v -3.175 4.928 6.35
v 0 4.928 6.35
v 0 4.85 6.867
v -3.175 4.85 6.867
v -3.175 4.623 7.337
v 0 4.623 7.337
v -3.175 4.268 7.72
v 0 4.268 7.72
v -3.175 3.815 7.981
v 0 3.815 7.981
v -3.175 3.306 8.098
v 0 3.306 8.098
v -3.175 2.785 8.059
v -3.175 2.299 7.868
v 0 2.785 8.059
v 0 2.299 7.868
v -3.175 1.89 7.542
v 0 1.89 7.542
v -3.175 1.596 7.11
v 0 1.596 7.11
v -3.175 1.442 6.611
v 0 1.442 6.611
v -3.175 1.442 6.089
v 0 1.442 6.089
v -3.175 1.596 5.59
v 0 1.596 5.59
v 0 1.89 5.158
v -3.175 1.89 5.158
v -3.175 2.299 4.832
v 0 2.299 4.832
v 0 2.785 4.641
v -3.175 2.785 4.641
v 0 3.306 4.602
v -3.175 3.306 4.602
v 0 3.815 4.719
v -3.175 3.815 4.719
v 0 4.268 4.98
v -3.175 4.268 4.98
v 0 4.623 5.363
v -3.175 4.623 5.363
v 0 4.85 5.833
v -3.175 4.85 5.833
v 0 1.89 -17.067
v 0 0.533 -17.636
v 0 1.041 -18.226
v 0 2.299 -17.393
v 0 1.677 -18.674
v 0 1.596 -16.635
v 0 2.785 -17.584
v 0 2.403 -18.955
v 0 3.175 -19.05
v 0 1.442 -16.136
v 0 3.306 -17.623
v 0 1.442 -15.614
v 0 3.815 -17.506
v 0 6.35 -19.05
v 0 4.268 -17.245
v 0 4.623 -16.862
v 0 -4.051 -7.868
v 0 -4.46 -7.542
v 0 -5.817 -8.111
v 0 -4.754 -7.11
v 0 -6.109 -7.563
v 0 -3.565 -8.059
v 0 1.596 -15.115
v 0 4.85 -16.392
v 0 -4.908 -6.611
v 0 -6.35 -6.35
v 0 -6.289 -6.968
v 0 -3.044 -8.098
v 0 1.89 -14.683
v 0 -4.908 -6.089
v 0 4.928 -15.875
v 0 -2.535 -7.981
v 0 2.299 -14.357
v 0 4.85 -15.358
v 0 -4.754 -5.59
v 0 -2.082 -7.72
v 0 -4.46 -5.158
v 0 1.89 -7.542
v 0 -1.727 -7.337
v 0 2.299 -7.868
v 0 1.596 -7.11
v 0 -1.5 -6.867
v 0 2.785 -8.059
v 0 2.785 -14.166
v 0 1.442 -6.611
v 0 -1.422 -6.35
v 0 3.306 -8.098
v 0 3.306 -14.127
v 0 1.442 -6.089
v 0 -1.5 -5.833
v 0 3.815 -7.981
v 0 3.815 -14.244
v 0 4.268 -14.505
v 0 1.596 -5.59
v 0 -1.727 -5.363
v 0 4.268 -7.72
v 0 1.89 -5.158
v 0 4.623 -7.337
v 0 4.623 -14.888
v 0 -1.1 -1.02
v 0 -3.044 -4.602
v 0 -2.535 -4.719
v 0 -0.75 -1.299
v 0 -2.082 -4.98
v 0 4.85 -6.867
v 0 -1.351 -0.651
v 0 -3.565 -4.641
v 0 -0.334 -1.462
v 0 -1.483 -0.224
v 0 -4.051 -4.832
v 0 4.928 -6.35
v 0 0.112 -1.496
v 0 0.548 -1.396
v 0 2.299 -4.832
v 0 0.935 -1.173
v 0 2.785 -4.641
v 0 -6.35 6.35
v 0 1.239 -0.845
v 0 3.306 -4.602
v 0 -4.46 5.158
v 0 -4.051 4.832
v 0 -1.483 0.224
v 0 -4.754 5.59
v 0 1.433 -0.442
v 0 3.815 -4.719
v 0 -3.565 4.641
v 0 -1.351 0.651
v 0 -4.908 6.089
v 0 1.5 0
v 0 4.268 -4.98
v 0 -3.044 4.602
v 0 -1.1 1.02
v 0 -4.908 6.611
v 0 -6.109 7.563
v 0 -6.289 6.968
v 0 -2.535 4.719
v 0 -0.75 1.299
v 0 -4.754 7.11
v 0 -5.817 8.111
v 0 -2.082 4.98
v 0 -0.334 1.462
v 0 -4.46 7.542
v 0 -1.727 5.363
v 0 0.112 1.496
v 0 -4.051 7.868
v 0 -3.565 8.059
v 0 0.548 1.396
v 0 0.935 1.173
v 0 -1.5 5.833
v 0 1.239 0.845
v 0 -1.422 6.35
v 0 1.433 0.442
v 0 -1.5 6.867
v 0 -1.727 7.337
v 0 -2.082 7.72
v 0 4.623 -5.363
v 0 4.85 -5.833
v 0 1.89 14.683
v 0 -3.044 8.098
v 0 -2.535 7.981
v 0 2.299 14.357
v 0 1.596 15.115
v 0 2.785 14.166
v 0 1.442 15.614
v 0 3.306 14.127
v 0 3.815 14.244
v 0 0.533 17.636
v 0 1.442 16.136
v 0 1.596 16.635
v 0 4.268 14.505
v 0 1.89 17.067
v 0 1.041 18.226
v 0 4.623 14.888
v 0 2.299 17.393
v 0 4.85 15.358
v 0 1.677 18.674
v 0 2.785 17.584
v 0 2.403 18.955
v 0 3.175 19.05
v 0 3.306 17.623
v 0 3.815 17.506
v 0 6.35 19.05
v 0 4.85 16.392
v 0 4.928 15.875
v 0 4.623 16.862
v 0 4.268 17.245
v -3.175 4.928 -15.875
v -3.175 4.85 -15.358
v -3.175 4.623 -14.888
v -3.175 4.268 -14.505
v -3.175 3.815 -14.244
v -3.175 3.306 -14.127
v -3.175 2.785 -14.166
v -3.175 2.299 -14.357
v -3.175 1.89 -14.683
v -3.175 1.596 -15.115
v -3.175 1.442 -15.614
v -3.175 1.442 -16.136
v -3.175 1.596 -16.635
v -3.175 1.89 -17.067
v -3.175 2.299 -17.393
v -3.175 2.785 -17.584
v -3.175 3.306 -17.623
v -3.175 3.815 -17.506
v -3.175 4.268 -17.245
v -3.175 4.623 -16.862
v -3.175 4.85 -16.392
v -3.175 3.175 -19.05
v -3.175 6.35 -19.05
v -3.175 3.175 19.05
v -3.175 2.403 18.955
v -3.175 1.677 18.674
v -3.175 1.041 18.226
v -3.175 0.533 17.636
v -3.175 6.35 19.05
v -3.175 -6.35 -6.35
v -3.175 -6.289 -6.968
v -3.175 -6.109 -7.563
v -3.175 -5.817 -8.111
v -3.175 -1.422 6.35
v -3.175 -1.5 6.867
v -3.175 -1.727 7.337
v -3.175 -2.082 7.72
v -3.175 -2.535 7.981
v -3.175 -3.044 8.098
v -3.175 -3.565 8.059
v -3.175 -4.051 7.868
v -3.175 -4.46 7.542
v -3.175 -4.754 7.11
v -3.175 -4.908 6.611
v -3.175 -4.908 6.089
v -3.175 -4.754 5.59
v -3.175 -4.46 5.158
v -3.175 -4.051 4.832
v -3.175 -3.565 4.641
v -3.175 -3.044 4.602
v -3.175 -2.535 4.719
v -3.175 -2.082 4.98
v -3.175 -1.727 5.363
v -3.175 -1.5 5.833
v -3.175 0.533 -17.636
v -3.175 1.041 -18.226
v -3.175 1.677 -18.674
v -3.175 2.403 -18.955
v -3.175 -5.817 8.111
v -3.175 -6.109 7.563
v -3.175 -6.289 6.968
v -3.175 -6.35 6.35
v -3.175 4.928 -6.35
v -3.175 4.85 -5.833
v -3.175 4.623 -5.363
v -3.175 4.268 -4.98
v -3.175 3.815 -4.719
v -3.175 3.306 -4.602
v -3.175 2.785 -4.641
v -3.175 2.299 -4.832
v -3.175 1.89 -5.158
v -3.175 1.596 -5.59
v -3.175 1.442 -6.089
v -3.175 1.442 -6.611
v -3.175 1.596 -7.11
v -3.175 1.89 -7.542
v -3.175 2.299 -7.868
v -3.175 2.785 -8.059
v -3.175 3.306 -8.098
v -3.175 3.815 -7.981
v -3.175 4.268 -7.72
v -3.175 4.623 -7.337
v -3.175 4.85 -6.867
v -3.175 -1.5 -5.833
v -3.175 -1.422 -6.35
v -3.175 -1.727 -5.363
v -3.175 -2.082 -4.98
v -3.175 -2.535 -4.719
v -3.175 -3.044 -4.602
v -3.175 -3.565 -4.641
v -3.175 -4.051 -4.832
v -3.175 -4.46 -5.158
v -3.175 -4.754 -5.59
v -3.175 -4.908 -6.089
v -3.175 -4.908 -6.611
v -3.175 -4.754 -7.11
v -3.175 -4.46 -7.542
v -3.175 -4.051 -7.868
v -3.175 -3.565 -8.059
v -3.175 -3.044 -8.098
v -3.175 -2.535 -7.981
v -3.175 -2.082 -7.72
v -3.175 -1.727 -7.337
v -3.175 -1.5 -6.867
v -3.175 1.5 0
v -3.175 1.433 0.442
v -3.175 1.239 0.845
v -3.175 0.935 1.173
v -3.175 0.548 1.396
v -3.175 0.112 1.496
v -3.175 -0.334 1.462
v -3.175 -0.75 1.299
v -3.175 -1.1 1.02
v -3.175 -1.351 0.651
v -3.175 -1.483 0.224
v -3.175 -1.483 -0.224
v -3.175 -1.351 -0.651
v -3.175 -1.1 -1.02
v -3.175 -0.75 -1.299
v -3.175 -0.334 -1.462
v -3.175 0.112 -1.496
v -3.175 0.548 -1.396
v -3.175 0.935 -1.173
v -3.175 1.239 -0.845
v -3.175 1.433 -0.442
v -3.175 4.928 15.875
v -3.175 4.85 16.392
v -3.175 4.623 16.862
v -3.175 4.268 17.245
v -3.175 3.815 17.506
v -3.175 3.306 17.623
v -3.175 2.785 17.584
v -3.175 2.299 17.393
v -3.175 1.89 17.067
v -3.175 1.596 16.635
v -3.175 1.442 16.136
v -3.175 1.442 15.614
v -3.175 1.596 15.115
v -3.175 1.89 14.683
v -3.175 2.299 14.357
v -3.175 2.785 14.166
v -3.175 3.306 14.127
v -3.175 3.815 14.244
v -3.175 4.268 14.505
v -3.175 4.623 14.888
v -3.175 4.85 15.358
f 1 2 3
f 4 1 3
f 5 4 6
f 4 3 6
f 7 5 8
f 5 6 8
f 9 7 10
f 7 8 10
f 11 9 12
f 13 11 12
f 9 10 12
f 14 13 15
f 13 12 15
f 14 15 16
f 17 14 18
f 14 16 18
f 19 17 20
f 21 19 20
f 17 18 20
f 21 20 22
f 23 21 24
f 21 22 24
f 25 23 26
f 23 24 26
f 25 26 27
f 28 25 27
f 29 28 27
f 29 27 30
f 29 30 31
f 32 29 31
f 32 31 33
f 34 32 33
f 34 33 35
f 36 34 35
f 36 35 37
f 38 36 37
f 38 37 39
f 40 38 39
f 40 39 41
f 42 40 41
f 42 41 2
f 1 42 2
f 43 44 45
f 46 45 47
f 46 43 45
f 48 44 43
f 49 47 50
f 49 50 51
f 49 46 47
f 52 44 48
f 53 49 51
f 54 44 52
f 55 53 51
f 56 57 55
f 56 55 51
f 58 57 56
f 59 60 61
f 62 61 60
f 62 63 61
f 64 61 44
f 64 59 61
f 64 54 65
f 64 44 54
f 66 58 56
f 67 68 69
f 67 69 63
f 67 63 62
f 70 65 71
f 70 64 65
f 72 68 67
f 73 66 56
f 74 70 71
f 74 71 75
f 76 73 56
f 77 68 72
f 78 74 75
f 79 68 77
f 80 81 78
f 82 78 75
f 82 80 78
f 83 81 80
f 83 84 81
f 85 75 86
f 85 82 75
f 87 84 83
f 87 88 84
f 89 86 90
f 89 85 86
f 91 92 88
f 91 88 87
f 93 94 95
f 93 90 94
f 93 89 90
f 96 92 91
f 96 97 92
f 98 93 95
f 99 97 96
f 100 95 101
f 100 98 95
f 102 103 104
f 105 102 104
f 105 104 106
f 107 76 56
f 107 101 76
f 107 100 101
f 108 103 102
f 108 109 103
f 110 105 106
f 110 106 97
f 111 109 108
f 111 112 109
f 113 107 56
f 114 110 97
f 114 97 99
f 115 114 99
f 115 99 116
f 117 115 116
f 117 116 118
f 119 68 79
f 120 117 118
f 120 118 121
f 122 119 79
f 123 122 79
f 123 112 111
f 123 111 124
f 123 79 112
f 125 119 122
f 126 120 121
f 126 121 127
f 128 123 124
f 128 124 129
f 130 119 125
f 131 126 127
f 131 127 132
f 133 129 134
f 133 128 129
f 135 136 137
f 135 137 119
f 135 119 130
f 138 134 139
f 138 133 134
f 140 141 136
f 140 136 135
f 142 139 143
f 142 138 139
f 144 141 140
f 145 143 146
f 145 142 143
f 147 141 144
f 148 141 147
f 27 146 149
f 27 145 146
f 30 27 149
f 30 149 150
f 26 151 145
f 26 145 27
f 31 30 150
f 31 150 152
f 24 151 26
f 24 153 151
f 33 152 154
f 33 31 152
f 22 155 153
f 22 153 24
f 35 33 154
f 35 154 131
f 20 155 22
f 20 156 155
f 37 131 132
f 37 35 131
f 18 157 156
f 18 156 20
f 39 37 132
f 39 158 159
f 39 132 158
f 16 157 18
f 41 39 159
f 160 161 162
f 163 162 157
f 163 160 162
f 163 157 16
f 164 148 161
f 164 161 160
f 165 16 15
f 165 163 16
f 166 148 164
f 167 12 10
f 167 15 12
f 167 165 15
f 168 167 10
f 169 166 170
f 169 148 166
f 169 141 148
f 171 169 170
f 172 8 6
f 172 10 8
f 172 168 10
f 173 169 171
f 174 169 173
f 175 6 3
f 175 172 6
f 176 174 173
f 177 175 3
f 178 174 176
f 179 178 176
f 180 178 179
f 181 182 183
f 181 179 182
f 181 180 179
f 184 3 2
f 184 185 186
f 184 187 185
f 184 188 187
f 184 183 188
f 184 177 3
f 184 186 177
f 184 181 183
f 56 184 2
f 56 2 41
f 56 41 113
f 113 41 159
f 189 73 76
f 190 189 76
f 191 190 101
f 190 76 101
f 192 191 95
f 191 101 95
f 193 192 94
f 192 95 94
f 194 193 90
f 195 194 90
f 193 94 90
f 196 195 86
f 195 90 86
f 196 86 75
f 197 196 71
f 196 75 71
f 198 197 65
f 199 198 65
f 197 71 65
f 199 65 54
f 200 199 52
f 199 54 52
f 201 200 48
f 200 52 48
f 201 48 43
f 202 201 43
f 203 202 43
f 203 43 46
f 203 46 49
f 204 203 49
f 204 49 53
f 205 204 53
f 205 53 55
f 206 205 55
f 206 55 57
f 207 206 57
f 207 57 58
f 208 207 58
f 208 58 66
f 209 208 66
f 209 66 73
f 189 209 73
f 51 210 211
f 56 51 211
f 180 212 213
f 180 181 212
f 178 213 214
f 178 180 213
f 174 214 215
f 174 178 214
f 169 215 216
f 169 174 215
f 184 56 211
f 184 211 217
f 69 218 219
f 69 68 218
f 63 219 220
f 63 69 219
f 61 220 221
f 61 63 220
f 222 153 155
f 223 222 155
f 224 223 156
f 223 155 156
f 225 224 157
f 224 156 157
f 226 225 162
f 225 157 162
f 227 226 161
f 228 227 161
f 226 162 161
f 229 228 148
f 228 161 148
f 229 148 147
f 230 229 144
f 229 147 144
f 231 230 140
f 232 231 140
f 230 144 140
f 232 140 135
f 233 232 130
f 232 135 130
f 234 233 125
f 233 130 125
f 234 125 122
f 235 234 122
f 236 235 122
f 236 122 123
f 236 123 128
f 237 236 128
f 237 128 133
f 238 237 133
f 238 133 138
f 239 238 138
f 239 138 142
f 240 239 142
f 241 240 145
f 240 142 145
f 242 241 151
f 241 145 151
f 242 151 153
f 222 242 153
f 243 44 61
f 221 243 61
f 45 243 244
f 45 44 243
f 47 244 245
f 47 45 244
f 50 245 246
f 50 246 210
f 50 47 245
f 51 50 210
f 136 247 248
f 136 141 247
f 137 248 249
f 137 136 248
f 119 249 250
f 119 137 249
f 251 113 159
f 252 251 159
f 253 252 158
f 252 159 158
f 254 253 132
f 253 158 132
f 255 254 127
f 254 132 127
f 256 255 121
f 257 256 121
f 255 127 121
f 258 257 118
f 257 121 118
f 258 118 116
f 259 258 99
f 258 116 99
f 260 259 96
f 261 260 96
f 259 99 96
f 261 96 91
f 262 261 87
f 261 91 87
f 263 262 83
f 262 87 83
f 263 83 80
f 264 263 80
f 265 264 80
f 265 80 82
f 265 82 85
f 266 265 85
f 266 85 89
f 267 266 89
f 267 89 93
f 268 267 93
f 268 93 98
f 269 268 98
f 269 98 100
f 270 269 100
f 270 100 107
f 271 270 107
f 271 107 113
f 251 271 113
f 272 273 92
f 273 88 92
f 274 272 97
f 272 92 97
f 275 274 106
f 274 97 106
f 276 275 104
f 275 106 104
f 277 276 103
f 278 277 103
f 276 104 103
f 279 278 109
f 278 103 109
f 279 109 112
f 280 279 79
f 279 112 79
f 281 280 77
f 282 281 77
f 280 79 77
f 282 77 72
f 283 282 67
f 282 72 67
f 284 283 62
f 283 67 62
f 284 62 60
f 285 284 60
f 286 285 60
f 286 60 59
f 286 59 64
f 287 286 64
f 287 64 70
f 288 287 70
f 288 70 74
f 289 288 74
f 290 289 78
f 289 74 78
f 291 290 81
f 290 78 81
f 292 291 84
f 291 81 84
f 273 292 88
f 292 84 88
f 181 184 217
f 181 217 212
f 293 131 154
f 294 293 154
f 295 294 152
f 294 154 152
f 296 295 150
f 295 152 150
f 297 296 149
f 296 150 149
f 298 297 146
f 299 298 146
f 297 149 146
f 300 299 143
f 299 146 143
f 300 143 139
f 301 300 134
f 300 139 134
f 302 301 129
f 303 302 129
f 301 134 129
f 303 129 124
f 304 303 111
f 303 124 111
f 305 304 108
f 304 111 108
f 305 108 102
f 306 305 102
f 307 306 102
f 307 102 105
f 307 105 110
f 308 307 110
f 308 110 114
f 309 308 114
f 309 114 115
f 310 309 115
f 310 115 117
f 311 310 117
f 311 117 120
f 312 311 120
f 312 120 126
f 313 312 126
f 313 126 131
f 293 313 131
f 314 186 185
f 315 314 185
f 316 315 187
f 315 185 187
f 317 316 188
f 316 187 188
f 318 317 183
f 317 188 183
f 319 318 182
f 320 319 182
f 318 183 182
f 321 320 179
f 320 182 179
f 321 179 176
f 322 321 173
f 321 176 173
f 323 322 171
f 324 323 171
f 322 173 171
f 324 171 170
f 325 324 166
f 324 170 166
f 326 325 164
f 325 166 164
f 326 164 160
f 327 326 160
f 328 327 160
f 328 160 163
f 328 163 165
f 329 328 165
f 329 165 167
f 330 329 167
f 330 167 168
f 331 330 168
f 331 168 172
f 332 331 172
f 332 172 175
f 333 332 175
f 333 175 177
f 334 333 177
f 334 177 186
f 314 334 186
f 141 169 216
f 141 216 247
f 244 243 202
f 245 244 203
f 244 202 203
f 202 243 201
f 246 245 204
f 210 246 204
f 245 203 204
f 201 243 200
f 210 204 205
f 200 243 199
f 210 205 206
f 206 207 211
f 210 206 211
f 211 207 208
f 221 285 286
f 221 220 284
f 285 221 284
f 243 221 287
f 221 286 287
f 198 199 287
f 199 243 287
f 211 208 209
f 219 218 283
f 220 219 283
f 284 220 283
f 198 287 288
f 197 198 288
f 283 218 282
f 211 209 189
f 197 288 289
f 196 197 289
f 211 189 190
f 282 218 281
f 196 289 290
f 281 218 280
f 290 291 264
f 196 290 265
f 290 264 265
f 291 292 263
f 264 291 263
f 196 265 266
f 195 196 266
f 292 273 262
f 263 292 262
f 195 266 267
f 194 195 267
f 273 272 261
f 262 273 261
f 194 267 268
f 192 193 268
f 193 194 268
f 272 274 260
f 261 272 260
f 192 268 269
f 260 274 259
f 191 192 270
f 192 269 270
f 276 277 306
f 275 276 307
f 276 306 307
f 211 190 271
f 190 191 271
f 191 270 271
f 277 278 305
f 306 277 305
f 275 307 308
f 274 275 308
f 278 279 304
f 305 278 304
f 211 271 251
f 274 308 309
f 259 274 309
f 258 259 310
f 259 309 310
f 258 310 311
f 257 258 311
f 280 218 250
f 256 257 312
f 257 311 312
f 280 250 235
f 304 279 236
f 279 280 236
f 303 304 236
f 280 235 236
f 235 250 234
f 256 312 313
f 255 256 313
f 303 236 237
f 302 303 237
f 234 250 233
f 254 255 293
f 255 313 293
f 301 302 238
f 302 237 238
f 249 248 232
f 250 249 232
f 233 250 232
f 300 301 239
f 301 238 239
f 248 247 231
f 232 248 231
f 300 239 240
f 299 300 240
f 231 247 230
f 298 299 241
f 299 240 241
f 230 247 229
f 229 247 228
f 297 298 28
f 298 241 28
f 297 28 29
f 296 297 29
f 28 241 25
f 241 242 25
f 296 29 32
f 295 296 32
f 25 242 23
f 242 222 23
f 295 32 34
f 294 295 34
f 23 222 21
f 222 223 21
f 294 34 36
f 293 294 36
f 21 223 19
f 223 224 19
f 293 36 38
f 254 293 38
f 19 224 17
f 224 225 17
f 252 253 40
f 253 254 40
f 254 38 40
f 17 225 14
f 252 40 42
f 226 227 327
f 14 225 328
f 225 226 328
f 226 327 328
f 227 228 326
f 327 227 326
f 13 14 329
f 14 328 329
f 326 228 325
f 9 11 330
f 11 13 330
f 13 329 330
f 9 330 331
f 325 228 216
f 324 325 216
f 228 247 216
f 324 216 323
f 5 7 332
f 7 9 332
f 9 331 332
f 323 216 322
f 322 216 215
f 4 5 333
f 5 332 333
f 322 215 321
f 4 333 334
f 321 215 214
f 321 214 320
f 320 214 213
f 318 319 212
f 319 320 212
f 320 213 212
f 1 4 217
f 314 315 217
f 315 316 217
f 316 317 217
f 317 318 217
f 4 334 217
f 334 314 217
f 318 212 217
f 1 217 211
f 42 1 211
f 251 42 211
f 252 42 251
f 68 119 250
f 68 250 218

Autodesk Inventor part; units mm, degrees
ref_plane "YZ Plane" through (0, 0, 0) normal (1, 0, 0) x (0, 1, 0)
ref_plane "XZ Plane" through (0, 0, 0) normal (0, 1, 0) x (-1, 0, 0)
ref_plane "XY Plane" through (0, 0, 0) normal (0, 0, 1) x (1, 0, 0)
sketch "Sketch1" plane through (0, 0, 0) normal (1, 0, 0) x (0, 1, 0)
  line L0 (3.175, 6.35) -> (-3.175, 6.35) construction
  line L1 (-3.175, 6.35) -> (-3.175, -6.35) construction
  line L2 (-3.175, -6.35) -> (3.175, -6.35) construction
  line L3 (3.175, -6.35) -> (3.175, 6.35) construction
  line L4 (3.175, 6.35) -> (-3.175, -6.35) construction
  line L5 (-3.175, 6.35) -> (3.175, -6.35) construction
  circle A0 centre (0, 0) radius 1.5
  circle A1 centre (3.175, 6.35) radius 1.7526
  circle A2 centre (3.175, -6.35) radius 1.7526
  circle A3 centre (-3.175, 6.35) radius 1.7526
  circle A4 centre (-3.175, -6.35) radius 1.7526
  line L6 (6.35, 19.05) -> (-6.35, 19.05)
  line L7 (-6.35, 19.05) -> (-6.35, -19.05)
  line L8 (-6.35, -19.05) -> (6.35, -19.05)
  line L9 (6.35, -19.05) -> (6.35, 19.05)
  line L10 (6.35, 19.05) -> (-6.35, -19.05) construction
  line L11 (-6.35, 19.05) -> (6.35, -19.05) construction
  line L12 (-6.35, 0) -> (6.35, 0) construction
  line L13 (-6.35, -3.175) -> (6.35, -3.175)
  line L14 (6.35, 3.175) -> (-6.35, 3.175)
  arc A5 (-6.35, 3.175) -> (-6.35, -3.175) centre (-6.35, 0) ccw
  arc A6 (6.35, -3.175) -> (6.35, 3.175) centre (6.35, 0) ccw
  circle A7 centre (3.175, 15.875) radius 1.7526
  arc A8 (3.175, 19.05) -> (0.5332, 17.6362) centre (3.175, 15.875) ccw
  arc A9 (-5.8168, 8.1112) -> (-6.35, 6.35) centre (-3.175, 6.35) ccw
  line L15 (0.5332, 17.6362) -> (-5.8168, 8.1112)
  circle A10 centre (3.175, -15.875) radius 1.7526
  arc A11 (0.5332, -17.6362) -> (3.175, -19.05) centre (3.175, -15.875) ccw
  arc A12 (-6.35, -6.35) -> (-5.8168, -8.1112) centre (-3.175, -6.35) ccw
  line L16 (0.5332, -17.6362) -> (-5.8168, -8.1112)
  point P0 (3.175, -19.05)
  point P1 (-6.35, -6.35)
  dimension "d0" = 6.35
  dimension "d1" = 12.7
  dimension "d2" = 3
  dimension "d3" = 3.5052
  dimension "d6" = 12.7
  dimension "d9" = 6.35
  dimension "d12" = 12.7
  dimension "d13" = 38.1
  dimension "d14" = 6.35
  dimension "d20" = 3.5052
  dimension "d21" = 9.525
extrude "Extrusion2" add sketch "Sketch1" against normal blind 3.175 contours L9 L14 L7 A9 L15 A8 L6 | L9 L13 L7 L14 | L9 L8 A11 L16 A12 L7 L13
equation "\"d3\" = d20"
equation "\"d6\" = d1"
equation "\"d9\" = d0"
properties part number "Pin Cap" material "Aluminum 6061"
